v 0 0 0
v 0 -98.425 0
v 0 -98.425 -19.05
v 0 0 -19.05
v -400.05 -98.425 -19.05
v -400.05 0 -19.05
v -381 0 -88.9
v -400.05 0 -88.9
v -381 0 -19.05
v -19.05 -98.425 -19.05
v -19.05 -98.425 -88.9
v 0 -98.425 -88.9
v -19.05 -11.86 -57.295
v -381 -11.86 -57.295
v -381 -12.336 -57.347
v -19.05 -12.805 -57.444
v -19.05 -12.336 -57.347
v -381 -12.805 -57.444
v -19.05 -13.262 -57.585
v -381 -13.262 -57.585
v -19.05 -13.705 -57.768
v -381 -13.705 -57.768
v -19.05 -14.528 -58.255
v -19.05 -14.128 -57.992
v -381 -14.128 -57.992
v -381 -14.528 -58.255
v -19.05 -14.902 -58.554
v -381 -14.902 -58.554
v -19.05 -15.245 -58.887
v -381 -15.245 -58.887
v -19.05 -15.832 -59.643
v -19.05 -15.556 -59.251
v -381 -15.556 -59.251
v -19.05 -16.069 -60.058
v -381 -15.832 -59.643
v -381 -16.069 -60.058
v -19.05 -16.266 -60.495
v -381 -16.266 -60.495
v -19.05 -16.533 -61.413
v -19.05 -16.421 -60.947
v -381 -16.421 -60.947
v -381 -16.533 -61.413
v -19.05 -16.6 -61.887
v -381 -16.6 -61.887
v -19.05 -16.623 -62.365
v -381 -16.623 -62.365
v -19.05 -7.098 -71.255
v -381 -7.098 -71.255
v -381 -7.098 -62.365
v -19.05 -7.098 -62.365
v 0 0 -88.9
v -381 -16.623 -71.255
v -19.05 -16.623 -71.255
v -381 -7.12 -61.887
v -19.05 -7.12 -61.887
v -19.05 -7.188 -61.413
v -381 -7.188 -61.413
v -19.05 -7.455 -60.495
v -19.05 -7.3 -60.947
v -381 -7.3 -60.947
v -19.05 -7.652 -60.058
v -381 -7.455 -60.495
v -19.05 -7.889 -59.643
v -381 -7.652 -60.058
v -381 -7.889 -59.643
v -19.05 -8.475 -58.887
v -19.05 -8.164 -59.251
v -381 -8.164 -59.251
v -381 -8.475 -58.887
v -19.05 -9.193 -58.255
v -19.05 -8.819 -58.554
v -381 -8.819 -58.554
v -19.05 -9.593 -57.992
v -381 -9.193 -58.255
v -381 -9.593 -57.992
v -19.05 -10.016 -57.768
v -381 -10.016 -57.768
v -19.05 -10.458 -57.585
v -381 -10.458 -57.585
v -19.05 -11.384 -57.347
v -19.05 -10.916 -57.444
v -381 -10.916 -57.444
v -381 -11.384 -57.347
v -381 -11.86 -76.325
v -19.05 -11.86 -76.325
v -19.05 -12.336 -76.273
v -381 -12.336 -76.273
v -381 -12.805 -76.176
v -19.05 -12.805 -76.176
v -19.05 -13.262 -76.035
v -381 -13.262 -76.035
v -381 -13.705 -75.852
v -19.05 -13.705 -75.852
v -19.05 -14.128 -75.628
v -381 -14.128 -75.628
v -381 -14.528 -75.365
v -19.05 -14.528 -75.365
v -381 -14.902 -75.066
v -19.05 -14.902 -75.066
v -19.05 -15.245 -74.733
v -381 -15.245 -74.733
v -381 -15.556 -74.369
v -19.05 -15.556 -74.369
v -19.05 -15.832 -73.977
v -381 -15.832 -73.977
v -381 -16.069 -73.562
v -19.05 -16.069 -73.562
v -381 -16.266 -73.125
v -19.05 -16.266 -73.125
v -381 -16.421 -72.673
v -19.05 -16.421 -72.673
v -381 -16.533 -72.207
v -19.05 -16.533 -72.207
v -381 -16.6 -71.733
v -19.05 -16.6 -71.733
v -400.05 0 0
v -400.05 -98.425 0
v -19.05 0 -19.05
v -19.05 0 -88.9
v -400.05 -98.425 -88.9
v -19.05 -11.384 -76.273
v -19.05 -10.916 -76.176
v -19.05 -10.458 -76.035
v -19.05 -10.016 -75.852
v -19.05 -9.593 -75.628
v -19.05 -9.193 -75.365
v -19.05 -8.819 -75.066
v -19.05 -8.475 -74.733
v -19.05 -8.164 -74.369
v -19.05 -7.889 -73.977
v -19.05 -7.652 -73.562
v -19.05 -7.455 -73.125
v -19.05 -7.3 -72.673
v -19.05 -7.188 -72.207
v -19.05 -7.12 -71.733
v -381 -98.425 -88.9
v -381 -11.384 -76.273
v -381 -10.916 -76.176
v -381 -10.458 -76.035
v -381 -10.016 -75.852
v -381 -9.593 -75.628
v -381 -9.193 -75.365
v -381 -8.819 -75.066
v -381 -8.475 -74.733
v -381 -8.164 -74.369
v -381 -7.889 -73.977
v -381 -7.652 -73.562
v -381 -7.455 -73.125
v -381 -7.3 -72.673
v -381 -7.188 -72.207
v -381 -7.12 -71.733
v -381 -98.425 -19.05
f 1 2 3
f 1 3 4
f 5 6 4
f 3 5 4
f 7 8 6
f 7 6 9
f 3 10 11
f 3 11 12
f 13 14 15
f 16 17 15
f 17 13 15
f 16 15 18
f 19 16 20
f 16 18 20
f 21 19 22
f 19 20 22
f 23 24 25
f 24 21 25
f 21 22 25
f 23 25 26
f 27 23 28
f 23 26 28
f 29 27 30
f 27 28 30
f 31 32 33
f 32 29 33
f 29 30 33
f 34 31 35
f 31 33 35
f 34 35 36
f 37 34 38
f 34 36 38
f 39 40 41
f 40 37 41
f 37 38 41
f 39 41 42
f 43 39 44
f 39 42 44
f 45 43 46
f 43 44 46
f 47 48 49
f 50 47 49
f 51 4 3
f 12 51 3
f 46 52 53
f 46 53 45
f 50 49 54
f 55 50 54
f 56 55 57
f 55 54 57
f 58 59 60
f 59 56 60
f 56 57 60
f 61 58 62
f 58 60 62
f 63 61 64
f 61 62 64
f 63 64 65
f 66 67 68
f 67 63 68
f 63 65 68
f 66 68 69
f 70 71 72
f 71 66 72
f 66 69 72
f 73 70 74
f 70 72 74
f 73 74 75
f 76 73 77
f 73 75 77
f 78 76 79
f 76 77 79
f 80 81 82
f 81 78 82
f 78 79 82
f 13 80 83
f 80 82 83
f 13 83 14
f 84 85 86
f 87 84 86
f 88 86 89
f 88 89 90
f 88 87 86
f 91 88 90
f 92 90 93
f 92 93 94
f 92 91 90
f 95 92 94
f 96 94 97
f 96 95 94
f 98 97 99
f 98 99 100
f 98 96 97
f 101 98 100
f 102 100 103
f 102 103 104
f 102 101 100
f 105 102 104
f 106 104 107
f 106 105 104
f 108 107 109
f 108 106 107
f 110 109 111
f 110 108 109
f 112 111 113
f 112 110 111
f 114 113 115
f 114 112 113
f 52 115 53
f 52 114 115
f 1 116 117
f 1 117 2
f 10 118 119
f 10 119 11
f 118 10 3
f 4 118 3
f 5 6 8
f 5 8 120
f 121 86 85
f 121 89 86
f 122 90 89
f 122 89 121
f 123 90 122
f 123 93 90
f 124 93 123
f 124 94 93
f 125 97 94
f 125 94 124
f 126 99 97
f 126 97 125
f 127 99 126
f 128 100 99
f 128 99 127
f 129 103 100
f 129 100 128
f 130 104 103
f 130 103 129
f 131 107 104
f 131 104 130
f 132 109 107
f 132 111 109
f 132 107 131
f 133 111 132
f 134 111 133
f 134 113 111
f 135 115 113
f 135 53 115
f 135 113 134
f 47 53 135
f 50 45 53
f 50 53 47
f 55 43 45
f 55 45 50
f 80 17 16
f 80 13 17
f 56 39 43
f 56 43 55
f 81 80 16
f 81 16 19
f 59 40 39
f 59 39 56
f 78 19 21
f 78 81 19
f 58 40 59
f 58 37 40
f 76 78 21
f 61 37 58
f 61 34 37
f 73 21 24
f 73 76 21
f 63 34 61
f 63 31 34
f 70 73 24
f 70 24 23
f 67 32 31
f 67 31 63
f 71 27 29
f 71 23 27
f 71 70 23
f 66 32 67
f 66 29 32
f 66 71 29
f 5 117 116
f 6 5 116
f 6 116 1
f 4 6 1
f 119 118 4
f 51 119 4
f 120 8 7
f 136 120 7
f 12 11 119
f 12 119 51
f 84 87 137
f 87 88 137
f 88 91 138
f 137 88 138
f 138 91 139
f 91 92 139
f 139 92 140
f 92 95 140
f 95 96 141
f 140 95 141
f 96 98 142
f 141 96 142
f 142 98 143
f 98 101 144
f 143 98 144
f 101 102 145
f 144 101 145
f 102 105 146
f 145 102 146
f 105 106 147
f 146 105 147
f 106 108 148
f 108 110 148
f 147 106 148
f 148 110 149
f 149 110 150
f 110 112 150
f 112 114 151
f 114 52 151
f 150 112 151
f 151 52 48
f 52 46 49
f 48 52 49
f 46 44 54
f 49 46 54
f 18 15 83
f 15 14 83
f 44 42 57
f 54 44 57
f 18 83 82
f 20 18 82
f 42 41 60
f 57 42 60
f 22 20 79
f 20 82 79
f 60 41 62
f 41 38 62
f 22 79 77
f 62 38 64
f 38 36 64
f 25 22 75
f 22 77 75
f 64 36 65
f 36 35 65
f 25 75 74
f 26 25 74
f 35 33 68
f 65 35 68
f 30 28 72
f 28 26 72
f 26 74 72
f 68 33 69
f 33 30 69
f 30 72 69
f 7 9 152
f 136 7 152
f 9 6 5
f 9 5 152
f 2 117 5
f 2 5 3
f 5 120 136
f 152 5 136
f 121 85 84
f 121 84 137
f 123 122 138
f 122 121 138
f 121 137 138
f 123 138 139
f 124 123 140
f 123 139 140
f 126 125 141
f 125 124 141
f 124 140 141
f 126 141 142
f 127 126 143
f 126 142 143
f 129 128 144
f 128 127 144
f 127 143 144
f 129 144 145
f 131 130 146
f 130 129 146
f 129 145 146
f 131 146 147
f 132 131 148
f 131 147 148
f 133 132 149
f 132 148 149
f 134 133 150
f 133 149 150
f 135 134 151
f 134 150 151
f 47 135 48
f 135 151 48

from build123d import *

# Parameters (mm, degrees)
F0_W        = 400.05
F0_H        = 98.425
F1_DEPTH    = 19.05
F2_W        = 19.05
F2_H        = 98.425
F3_DEPTH    = 69.85
F4_W        = 9.525
F4_H        = 19.05
F5_DEPTH    = 361.95
F6_T1_DEPTH = 387.35


# Not quite as in the source:
# - a fillet or chamfer that OpenCascade refuses, or shapes differently, is made with other operations: its cross-section is extruded or revolved along the edge and cut away or added


with BuildPart() as f1:
    # F0 (on Top) → F1 (new body)
    with BuildSketch(Plane.XY):
        with Locations((-200.025, -49.2125)):
            Rectangle(F0_W, F0_H)
    extrude(amount=-F1_DEPTH)


with BuildPart() as f3:
    # F2 (on face) → F3 (new body)
    with BuildSketch(Plane(origin=(0, 0, -19.05), x_dir=(1, 0, 0), z_dir=(0, 0, -1))):
        with Locations((-9.525, 49.2125)):
            Rectangle(F2_W, F2_H)
    extrude(amount=F3_DEPTH)


with BuildPart() as f3b:
    # F2 (on face) → F3, piece 2 (new body)
    with BuildSketch(Plane(origin=(0, 0, -19.05), x_dir=(1, 0, 0), z_dir=(0, 0, -1))):
        with Locations((-390.525, 49.2125)):
            Rectangle(F2_W, F2_H)
    extrude(amount=F3_DEPTH)


with BuildPart() as f5:
    # F4 (on face) → F5 (new body, through all)
    with BuildSketch(Plane.YZ.offset(-381)):
        with Locations((-11.8602966547, -66.8099847376)):
            Rectangle(F4_W, F4_H)
    extrude(amount=F5_DEPTH)

    # F6: fillet of radius 5.08 on 4 edges, made by hand

    # F6_s2 → F6_t1 (cut)
    with BuildSketch(Plane.YZ.offset(-393.7)):
        with BuildLine():
            ThreePointArc((-11.5427966547, -76.3349847376), (-15.1348991031, -74.8470871861), (-16.6227966547, -71.2549847376))
            Line((-16.6227966547, -71.2549847376), (-16.6227966547, -76.3349847376))
            Line((-16.6227966547, -76.3349847376), (-11.5427966547, -76.3349847376))
        make_face()
        with BuildLine():
            ThreePointArc((-12.1777966547, -76.3349847376), (-8.5856942063, -74.8470871861), (-7.0977966547, -71.2549847376))
            Line((-7.0977966547, -71.2549847376), (-7.0977966547, -76.3349847376))
            Line((-7.0977966547, -76.3349847376), (-12.1777966547, -76.3349847376))
        make_face()
        with BuildLine():
            ThreePointArc((-11.5427966547, -57.2849847376), (-15.1348991031, -58.7728822892), (-16.6227966547, -62.3649847376))
            Line((-16.6227966547, -62.3649847376), (-16.6227966547, -57.2849847376))
            Line((-16.6227966547, -57.2849847376), (-11.5427966547, -57.2849847376))
        make_face()
        with BuildLine():
            ThreePointArc((-7.0977966547, -62.3649847376), (-8.5856942063, -58.7728822892), (-12.1777966547, -57.2849847376))
            Line((-12.1777966547, -57.2849847376), (-7.0977966547, -57.2849847376))
            Line((-7.0977966547, -57.2849847376), (-7.0977966547, -62.3649847376))
        make_face()
    extrude(amount=F6_T1_DEPTH, mode=Mode.SUBTRACT)


solid = Compound([f1.part, f3.part, f3b.part, f5.part])
